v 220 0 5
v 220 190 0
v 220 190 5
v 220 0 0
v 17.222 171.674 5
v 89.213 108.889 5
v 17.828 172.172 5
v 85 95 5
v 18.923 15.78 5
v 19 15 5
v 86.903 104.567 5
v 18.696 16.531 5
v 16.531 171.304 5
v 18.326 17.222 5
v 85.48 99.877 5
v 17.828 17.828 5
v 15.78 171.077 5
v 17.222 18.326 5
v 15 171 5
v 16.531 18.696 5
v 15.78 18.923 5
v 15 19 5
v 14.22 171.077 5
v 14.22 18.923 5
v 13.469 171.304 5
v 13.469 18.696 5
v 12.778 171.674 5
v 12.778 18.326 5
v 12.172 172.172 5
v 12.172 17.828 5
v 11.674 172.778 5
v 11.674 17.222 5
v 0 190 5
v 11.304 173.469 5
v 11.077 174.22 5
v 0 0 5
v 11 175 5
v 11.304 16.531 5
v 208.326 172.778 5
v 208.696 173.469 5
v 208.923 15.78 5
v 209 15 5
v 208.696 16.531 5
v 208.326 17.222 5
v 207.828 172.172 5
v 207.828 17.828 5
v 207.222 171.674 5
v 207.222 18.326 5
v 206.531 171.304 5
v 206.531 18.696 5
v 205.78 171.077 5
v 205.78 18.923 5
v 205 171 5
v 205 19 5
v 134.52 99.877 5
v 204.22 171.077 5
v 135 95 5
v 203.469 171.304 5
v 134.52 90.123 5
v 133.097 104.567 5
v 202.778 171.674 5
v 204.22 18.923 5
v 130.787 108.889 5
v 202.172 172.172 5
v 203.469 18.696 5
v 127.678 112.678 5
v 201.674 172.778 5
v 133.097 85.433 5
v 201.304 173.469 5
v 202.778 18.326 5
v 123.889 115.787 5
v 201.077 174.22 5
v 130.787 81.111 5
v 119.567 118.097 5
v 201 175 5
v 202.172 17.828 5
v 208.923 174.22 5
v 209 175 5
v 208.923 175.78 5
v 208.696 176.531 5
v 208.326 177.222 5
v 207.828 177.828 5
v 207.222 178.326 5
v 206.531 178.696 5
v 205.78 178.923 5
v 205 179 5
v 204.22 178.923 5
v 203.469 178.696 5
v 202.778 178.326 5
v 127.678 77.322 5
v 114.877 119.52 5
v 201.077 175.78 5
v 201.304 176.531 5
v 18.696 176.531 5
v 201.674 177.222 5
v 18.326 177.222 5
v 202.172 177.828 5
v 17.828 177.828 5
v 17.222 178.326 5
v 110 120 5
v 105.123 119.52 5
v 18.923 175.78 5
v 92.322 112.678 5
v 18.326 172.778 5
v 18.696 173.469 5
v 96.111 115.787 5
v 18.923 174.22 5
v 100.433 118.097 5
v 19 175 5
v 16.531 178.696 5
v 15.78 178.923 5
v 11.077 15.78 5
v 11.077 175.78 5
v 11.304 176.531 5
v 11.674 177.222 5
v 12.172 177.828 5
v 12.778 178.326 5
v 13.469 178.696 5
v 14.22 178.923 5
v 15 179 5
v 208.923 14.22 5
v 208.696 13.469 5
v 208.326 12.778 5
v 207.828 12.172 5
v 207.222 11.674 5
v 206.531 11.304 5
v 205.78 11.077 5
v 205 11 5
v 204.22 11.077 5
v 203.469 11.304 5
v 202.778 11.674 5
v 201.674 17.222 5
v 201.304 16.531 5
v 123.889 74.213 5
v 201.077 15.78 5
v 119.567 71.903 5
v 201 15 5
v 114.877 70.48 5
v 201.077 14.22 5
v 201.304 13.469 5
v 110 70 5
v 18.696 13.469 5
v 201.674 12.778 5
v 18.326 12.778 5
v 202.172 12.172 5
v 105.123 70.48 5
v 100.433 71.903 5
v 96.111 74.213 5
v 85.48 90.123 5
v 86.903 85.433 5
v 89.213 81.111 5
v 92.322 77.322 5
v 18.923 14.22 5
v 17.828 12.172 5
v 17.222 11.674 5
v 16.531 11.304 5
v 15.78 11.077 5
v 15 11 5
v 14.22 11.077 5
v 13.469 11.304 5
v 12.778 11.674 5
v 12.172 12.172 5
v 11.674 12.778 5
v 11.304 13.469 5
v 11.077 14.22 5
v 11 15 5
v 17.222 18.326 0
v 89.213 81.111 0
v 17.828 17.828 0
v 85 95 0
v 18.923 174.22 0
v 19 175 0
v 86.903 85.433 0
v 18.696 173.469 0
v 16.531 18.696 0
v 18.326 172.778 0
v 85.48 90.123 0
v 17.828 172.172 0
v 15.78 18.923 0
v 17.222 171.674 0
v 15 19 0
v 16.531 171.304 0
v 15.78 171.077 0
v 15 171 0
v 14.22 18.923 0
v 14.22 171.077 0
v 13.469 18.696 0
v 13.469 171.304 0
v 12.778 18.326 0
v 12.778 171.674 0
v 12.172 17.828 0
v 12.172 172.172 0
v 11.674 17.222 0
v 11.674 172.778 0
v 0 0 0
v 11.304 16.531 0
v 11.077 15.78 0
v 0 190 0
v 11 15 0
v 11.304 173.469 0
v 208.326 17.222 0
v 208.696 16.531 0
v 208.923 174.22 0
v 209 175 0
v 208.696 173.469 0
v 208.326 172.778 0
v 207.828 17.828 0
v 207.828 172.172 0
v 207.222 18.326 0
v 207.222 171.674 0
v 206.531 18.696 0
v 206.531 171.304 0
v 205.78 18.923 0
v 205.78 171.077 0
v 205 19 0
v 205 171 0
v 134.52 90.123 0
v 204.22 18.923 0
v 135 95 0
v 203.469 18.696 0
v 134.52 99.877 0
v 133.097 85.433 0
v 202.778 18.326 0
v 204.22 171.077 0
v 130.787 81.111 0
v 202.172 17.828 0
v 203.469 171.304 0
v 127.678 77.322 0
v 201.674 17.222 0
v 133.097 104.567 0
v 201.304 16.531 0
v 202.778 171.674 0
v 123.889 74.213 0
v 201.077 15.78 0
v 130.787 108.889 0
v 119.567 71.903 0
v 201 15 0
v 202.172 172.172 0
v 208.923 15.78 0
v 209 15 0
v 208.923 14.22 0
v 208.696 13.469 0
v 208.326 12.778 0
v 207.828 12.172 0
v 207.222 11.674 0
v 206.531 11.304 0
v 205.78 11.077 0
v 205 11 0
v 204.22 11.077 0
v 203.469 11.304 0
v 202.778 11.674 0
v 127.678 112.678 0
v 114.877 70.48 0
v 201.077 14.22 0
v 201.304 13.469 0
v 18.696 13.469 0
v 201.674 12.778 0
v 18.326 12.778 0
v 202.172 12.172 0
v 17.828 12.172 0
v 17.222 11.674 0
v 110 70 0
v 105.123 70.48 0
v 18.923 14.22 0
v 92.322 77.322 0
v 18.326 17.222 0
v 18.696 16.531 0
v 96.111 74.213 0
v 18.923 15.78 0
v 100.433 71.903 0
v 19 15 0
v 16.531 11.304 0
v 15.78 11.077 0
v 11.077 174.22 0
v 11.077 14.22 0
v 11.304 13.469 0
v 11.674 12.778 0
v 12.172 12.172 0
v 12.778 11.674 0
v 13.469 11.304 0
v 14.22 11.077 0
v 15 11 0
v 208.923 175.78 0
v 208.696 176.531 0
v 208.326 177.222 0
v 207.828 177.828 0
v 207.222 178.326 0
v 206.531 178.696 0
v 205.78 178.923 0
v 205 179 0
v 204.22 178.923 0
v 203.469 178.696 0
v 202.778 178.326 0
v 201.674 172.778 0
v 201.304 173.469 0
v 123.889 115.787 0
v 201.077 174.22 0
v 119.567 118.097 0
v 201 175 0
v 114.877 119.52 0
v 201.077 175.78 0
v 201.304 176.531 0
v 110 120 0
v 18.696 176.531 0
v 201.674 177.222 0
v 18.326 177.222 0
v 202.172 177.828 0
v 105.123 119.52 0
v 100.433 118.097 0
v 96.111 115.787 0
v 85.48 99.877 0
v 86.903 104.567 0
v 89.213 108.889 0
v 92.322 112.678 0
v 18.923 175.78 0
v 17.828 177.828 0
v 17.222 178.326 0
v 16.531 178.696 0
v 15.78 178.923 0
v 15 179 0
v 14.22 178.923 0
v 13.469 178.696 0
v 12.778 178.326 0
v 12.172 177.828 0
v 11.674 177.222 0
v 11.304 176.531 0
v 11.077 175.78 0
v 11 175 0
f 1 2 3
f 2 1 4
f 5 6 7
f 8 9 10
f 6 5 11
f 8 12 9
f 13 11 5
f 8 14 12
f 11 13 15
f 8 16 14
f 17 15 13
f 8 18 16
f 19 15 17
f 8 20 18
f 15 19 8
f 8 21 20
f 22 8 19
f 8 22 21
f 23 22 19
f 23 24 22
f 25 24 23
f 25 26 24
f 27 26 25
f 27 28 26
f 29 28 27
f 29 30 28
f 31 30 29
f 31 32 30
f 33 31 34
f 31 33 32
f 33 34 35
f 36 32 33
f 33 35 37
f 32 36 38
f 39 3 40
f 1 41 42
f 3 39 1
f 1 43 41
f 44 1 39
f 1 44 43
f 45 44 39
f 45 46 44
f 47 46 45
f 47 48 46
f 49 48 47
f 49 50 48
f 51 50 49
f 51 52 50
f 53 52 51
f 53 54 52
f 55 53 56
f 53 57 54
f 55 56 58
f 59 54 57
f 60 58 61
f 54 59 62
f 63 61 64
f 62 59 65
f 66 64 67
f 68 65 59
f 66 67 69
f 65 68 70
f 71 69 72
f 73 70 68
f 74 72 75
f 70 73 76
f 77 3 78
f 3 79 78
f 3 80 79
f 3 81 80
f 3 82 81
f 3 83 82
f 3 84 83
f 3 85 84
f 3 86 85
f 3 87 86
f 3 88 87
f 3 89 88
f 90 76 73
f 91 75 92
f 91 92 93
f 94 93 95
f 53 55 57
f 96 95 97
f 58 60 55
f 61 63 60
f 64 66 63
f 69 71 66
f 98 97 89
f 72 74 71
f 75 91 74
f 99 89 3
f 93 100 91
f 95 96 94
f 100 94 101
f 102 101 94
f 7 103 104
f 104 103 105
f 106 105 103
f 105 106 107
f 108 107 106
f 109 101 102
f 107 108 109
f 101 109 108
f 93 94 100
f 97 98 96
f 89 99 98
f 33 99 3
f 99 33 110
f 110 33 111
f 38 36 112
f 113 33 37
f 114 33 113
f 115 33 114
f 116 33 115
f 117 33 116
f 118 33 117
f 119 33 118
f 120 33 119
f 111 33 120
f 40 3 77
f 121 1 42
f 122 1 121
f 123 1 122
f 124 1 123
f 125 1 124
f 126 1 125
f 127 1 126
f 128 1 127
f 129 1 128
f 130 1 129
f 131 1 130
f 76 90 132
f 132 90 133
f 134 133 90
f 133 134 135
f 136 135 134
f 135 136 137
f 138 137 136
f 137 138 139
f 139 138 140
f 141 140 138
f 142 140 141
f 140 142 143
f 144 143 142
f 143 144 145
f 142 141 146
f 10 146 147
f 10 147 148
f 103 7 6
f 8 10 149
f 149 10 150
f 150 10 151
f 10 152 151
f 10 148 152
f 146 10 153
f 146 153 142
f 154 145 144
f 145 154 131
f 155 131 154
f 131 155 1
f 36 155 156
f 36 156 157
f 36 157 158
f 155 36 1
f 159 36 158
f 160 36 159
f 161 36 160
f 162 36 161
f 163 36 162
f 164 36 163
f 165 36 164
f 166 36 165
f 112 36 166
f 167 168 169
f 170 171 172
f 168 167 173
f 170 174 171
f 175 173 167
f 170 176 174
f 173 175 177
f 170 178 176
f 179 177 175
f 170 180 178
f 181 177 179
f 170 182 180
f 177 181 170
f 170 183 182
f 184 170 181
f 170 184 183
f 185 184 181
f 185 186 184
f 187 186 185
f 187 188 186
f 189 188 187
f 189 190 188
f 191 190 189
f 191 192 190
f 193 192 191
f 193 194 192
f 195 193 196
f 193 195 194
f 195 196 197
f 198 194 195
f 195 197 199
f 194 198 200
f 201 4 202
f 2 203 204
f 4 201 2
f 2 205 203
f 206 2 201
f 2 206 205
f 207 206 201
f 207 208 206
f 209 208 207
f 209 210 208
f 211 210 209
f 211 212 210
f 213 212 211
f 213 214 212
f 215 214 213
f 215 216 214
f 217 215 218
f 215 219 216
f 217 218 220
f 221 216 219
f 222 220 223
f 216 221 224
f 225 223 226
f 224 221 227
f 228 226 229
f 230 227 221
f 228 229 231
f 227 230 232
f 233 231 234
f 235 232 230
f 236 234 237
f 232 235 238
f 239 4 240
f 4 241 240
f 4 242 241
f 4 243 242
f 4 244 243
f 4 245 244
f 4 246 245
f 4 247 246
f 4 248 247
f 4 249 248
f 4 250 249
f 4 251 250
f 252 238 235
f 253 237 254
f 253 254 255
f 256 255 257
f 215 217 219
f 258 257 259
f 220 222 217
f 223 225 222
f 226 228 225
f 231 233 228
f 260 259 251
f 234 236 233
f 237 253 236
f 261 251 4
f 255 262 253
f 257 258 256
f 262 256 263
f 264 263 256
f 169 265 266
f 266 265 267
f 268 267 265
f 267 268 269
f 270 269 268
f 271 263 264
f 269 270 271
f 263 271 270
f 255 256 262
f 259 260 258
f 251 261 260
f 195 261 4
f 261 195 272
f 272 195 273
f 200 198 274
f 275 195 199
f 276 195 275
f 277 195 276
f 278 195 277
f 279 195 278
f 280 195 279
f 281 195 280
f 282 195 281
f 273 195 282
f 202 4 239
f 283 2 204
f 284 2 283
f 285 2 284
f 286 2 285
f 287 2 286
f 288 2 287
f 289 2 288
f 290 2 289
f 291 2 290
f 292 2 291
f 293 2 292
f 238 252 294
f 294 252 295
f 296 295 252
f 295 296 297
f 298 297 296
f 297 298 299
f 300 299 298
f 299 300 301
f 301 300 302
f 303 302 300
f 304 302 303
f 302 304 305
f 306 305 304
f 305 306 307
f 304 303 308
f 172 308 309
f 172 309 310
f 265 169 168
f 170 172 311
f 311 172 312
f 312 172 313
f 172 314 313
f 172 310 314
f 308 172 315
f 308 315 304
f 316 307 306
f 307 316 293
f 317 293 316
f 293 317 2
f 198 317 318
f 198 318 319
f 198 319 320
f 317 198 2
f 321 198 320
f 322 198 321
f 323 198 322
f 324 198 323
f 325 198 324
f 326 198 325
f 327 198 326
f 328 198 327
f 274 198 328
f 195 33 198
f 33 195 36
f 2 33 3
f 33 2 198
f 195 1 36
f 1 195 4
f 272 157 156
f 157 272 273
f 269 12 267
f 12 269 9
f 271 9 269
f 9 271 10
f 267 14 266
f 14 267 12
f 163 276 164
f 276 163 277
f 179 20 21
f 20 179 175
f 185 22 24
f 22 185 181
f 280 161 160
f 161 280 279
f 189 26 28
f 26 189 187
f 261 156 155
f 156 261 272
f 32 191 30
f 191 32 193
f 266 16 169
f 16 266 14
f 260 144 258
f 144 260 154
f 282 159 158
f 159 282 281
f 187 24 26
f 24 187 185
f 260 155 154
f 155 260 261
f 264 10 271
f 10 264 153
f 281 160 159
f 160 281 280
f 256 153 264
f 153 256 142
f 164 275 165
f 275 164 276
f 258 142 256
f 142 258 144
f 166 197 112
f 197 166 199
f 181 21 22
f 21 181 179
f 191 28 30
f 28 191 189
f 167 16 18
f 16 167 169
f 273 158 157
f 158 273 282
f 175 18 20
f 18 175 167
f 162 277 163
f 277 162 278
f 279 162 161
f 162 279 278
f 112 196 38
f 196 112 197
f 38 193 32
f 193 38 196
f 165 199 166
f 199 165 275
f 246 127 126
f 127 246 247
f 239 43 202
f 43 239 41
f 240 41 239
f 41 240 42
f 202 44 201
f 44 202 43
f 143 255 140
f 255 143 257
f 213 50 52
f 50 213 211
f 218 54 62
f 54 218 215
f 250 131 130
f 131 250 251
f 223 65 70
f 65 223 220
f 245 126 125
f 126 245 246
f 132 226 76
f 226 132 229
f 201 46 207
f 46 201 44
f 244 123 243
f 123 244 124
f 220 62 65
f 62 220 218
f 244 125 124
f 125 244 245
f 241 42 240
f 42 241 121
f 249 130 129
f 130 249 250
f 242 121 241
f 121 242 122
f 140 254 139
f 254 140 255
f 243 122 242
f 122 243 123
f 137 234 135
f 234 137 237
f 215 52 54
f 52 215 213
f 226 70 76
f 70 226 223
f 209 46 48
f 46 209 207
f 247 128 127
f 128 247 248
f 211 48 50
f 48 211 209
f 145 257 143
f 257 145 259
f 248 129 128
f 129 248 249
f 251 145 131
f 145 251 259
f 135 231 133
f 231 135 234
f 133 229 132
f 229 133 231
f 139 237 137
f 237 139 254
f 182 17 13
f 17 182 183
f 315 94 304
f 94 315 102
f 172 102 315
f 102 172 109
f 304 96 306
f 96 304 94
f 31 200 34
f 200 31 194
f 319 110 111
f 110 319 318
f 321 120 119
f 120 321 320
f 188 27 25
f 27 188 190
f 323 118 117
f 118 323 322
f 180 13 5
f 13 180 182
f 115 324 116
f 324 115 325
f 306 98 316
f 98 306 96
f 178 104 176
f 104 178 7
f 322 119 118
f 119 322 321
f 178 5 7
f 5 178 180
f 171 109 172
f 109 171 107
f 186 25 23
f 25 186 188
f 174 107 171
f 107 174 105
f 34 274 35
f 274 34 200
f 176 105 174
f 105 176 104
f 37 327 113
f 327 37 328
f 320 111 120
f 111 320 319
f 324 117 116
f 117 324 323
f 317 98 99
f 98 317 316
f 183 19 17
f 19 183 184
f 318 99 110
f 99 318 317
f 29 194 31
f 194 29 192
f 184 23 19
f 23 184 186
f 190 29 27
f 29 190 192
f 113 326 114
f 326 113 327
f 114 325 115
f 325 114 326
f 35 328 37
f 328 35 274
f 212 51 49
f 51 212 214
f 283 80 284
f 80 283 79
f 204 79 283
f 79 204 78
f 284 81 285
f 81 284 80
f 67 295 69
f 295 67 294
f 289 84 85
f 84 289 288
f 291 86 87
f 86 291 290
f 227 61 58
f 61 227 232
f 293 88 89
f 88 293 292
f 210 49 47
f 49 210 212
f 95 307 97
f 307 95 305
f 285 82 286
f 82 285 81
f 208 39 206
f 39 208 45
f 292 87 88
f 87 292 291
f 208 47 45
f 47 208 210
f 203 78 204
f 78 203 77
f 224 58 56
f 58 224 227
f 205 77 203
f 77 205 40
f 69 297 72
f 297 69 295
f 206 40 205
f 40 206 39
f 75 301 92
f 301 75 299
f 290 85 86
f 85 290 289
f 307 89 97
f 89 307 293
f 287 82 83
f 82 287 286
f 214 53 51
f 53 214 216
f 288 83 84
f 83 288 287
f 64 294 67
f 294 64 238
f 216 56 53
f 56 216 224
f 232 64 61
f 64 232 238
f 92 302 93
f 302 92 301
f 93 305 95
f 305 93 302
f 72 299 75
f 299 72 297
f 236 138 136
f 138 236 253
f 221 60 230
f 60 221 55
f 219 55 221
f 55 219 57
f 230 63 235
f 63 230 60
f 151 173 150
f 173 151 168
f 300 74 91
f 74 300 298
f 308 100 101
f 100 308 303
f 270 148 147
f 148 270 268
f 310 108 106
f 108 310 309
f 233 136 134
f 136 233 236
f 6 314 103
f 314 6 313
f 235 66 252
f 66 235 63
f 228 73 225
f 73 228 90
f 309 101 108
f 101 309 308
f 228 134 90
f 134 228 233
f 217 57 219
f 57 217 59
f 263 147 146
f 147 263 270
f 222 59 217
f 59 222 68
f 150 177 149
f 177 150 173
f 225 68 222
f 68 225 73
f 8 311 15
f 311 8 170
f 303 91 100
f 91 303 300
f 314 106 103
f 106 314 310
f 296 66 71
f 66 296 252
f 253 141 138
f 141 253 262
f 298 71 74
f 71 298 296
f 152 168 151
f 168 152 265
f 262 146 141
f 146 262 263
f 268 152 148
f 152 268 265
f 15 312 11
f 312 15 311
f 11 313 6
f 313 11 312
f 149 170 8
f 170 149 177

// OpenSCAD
$fn = 32;

// ----------------------------------------------------------------------
// Big plate: 200-250 mm adapter plate
// ----------------------------------------------------------------------

// --- parameters (mm) ---
plate_l = 220;            // plate length, X
plate_w = 190;            // plate width, Y
plate_t = 5;              // plate thickness, Z
corner_d = 8;             // corner hole diameter
corner_in = 15;           // corner hole inset from the edges
bore_d = 50;              // central bore
fit_tol = 0.02;           // tolerance for press fits, mm
free_tol = 0.2;           // tolerance for clearance fits, mm

difference() {
  cube([plate_l, plate_w, plate_t]);
  translate([corner_in, corner_in, -1]) cylinder(h = plate_t + 2, d = corner_d);
  translate([plate_l - corner_in, corner_in, -1]) cylinder(h = plate_t + 2, d = corner_d);
  translate([corner_in, plate_w - corner_in, -1]) cylinder(h = plate_t + 2, d = corner_d);
  translate([plate_l - corner_in, plate_w - corner_in, -1]) cylinder(h = plate_t + 2, d = corner_d);
  translate([plate_l / 2, plate_w / 2, -1]) cylinder(h = plate_t + 2, d = bore_d);
}
